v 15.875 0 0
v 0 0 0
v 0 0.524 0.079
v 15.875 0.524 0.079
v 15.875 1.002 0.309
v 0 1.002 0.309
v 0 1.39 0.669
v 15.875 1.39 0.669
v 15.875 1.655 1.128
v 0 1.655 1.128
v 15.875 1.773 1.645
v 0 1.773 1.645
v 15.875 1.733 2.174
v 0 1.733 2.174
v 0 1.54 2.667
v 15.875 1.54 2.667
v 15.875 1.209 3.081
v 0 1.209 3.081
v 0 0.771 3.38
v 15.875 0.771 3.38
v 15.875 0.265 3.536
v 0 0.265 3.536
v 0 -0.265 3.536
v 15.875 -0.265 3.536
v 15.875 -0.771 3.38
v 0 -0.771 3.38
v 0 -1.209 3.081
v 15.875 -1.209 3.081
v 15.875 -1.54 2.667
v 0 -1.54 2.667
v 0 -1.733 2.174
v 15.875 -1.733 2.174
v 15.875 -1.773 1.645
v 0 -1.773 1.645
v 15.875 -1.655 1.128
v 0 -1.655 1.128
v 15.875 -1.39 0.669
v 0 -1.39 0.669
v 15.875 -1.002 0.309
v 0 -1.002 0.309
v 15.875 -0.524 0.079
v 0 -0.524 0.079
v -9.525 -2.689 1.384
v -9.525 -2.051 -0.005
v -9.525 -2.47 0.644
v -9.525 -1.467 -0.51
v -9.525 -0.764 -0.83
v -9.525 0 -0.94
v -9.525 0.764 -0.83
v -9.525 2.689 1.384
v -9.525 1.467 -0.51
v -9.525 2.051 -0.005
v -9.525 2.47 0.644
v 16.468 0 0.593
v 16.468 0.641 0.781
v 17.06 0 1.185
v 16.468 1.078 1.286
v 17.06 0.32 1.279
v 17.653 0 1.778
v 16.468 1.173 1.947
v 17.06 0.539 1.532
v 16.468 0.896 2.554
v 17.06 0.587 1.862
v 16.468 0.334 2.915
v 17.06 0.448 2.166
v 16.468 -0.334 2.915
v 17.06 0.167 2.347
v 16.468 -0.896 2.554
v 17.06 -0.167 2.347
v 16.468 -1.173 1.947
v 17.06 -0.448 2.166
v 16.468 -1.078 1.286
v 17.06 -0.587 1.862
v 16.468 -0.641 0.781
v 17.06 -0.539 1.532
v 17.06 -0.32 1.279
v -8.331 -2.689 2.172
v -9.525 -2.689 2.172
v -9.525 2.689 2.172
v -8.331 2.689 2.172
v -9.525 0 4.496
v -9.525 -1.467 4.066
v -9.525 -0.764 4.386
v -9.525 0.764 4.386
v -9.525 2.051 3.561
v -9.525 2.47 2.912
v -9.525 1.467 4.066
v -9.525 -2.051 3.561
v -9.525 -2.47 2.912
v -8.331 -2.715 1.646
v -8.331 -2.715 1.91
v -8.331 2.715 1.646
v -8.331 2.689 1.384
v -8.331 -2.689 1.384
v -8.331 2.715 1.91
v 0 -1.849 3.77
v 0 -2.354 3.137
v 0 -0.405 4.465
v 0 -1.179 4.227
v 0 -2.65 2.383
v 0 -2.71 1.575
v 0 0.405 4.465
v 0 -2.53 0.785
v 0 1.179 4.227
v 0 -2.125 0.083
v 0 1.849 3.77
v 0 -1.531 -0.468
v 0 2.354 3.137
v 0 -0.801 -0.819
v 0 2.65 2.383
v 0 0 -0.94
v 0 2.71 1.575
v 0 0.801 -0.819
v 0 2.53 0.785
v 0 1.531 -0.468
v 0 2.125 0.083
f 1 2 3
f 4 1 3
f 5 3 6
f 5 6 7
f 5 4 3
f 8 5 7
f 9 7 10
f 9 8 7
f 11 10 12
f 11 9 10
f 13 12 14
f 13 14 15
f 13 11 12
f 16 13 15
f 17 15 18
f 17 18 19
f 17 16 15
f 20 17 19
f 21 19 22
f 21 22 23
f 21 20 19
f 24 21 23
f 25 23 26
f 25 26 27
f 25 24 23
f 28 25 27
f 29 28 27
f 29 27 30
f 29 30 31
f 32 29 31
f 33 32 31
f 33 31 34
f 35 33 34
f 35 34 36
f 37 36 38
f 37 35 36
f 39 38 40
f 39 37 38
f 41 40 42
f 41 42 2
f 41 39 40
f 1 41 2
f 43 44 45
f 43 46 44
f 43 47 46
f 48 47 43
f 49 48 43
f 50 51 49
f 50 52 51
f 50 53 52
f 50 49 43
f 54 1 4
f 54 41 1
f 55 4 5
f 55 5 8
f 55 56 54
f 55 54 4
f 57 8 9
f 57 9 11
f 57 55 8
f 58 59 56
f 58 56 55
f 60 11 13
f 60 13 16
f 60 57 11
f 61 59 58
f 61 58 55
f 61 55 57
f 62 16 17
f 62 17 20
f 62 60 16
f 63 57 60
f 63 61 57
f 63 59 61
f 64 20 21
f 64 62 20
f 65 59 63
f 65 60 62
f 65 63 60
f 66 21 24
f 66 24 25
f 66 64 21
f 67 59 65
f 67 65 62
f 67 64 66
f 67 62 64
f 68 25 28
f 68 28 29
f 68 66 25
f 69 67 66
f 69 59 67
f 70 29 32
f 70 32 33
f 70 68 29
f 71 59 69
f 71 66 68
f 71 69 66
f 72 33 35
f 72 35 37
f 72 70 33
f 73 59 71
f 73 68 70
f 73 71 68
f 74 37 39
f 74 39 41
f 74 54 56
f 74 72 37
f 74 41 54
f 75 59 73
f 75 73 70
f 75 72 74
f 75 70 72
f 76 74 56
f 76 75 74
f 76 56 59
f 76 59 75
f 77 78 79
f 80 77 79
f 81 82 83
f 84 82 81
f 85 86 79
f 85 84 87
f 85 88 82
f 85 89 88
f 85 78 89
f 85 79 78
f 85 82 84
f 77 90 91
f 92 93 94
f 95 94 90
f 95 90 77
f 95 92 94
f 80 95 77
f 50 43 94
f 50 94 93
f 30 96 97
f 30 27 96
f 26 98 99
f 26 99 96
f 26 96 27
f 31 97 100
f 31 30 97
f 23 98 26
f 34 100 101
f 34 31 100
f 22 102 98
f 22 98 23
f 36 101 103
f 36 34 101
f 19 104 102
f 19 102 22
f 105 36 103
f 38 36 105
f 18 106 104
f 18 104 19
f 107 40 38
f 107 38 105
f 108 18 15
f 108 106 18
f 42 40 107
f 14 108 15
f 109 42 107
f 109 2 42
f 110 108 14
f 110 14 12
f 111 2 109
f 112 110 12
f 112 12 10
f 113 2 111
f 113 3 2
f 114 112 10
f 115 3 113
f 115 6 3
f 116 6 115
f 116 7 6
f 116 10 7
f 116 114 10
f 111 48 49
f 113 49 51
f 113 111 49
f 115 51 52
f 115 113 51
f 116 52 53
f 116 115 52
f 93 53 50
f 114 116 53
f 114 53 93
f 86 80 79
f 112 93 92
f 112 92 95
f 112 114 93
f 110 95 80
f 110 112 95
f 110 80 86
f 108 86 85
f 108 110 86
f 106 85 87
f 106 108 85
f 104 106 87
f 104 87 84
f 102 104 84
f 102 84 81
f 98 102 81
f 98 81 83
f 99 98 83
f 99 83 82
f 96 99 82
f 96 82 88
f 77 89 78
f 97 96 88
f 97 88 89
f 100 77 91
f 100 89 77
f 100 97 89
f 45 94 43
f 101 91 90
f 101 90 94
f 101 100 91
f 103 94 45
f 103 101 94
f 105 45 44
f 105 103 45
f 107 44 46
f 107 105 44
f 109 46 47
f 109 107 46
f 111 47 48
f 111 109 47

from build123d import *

# Parameters (mm, degrees)
SKETCH3_W          = 0.7874
SKETCH3_H          = 5.4356
CUT_EXTRUDE1_DEPTH = 1.1938


with BuildPart() as part:
    # Sketch2 → Revolve1 (revolve)
    with BuildSketch(Plane(origin=(0, 0, 0), x_dir=(1, 0, 0), z_dir=(0, 1, 0))):
        Polygon((0, 0), (15.875, 0), (17.653, -1.778), (-9.525, -1.778), (-9.525, 0.9398), (0, 0.9398), align=None)
    revolve(axis=Axis((-9.525, 0, 1.778), (1, 0, 0)))

    # Sketch3 → Cut-Extrude1 (cut)
    with BuildSketch(Plane.ZY.offset(9.525)):
        with Locations((1.778, 0)):
            Rectangle(SKETCH3_W, SKETCH3_H)
    extrude(amount=-CUT_EXTRUDE1_DEPTH, mode=Mode.SUBTRACT)


solid = part.part
